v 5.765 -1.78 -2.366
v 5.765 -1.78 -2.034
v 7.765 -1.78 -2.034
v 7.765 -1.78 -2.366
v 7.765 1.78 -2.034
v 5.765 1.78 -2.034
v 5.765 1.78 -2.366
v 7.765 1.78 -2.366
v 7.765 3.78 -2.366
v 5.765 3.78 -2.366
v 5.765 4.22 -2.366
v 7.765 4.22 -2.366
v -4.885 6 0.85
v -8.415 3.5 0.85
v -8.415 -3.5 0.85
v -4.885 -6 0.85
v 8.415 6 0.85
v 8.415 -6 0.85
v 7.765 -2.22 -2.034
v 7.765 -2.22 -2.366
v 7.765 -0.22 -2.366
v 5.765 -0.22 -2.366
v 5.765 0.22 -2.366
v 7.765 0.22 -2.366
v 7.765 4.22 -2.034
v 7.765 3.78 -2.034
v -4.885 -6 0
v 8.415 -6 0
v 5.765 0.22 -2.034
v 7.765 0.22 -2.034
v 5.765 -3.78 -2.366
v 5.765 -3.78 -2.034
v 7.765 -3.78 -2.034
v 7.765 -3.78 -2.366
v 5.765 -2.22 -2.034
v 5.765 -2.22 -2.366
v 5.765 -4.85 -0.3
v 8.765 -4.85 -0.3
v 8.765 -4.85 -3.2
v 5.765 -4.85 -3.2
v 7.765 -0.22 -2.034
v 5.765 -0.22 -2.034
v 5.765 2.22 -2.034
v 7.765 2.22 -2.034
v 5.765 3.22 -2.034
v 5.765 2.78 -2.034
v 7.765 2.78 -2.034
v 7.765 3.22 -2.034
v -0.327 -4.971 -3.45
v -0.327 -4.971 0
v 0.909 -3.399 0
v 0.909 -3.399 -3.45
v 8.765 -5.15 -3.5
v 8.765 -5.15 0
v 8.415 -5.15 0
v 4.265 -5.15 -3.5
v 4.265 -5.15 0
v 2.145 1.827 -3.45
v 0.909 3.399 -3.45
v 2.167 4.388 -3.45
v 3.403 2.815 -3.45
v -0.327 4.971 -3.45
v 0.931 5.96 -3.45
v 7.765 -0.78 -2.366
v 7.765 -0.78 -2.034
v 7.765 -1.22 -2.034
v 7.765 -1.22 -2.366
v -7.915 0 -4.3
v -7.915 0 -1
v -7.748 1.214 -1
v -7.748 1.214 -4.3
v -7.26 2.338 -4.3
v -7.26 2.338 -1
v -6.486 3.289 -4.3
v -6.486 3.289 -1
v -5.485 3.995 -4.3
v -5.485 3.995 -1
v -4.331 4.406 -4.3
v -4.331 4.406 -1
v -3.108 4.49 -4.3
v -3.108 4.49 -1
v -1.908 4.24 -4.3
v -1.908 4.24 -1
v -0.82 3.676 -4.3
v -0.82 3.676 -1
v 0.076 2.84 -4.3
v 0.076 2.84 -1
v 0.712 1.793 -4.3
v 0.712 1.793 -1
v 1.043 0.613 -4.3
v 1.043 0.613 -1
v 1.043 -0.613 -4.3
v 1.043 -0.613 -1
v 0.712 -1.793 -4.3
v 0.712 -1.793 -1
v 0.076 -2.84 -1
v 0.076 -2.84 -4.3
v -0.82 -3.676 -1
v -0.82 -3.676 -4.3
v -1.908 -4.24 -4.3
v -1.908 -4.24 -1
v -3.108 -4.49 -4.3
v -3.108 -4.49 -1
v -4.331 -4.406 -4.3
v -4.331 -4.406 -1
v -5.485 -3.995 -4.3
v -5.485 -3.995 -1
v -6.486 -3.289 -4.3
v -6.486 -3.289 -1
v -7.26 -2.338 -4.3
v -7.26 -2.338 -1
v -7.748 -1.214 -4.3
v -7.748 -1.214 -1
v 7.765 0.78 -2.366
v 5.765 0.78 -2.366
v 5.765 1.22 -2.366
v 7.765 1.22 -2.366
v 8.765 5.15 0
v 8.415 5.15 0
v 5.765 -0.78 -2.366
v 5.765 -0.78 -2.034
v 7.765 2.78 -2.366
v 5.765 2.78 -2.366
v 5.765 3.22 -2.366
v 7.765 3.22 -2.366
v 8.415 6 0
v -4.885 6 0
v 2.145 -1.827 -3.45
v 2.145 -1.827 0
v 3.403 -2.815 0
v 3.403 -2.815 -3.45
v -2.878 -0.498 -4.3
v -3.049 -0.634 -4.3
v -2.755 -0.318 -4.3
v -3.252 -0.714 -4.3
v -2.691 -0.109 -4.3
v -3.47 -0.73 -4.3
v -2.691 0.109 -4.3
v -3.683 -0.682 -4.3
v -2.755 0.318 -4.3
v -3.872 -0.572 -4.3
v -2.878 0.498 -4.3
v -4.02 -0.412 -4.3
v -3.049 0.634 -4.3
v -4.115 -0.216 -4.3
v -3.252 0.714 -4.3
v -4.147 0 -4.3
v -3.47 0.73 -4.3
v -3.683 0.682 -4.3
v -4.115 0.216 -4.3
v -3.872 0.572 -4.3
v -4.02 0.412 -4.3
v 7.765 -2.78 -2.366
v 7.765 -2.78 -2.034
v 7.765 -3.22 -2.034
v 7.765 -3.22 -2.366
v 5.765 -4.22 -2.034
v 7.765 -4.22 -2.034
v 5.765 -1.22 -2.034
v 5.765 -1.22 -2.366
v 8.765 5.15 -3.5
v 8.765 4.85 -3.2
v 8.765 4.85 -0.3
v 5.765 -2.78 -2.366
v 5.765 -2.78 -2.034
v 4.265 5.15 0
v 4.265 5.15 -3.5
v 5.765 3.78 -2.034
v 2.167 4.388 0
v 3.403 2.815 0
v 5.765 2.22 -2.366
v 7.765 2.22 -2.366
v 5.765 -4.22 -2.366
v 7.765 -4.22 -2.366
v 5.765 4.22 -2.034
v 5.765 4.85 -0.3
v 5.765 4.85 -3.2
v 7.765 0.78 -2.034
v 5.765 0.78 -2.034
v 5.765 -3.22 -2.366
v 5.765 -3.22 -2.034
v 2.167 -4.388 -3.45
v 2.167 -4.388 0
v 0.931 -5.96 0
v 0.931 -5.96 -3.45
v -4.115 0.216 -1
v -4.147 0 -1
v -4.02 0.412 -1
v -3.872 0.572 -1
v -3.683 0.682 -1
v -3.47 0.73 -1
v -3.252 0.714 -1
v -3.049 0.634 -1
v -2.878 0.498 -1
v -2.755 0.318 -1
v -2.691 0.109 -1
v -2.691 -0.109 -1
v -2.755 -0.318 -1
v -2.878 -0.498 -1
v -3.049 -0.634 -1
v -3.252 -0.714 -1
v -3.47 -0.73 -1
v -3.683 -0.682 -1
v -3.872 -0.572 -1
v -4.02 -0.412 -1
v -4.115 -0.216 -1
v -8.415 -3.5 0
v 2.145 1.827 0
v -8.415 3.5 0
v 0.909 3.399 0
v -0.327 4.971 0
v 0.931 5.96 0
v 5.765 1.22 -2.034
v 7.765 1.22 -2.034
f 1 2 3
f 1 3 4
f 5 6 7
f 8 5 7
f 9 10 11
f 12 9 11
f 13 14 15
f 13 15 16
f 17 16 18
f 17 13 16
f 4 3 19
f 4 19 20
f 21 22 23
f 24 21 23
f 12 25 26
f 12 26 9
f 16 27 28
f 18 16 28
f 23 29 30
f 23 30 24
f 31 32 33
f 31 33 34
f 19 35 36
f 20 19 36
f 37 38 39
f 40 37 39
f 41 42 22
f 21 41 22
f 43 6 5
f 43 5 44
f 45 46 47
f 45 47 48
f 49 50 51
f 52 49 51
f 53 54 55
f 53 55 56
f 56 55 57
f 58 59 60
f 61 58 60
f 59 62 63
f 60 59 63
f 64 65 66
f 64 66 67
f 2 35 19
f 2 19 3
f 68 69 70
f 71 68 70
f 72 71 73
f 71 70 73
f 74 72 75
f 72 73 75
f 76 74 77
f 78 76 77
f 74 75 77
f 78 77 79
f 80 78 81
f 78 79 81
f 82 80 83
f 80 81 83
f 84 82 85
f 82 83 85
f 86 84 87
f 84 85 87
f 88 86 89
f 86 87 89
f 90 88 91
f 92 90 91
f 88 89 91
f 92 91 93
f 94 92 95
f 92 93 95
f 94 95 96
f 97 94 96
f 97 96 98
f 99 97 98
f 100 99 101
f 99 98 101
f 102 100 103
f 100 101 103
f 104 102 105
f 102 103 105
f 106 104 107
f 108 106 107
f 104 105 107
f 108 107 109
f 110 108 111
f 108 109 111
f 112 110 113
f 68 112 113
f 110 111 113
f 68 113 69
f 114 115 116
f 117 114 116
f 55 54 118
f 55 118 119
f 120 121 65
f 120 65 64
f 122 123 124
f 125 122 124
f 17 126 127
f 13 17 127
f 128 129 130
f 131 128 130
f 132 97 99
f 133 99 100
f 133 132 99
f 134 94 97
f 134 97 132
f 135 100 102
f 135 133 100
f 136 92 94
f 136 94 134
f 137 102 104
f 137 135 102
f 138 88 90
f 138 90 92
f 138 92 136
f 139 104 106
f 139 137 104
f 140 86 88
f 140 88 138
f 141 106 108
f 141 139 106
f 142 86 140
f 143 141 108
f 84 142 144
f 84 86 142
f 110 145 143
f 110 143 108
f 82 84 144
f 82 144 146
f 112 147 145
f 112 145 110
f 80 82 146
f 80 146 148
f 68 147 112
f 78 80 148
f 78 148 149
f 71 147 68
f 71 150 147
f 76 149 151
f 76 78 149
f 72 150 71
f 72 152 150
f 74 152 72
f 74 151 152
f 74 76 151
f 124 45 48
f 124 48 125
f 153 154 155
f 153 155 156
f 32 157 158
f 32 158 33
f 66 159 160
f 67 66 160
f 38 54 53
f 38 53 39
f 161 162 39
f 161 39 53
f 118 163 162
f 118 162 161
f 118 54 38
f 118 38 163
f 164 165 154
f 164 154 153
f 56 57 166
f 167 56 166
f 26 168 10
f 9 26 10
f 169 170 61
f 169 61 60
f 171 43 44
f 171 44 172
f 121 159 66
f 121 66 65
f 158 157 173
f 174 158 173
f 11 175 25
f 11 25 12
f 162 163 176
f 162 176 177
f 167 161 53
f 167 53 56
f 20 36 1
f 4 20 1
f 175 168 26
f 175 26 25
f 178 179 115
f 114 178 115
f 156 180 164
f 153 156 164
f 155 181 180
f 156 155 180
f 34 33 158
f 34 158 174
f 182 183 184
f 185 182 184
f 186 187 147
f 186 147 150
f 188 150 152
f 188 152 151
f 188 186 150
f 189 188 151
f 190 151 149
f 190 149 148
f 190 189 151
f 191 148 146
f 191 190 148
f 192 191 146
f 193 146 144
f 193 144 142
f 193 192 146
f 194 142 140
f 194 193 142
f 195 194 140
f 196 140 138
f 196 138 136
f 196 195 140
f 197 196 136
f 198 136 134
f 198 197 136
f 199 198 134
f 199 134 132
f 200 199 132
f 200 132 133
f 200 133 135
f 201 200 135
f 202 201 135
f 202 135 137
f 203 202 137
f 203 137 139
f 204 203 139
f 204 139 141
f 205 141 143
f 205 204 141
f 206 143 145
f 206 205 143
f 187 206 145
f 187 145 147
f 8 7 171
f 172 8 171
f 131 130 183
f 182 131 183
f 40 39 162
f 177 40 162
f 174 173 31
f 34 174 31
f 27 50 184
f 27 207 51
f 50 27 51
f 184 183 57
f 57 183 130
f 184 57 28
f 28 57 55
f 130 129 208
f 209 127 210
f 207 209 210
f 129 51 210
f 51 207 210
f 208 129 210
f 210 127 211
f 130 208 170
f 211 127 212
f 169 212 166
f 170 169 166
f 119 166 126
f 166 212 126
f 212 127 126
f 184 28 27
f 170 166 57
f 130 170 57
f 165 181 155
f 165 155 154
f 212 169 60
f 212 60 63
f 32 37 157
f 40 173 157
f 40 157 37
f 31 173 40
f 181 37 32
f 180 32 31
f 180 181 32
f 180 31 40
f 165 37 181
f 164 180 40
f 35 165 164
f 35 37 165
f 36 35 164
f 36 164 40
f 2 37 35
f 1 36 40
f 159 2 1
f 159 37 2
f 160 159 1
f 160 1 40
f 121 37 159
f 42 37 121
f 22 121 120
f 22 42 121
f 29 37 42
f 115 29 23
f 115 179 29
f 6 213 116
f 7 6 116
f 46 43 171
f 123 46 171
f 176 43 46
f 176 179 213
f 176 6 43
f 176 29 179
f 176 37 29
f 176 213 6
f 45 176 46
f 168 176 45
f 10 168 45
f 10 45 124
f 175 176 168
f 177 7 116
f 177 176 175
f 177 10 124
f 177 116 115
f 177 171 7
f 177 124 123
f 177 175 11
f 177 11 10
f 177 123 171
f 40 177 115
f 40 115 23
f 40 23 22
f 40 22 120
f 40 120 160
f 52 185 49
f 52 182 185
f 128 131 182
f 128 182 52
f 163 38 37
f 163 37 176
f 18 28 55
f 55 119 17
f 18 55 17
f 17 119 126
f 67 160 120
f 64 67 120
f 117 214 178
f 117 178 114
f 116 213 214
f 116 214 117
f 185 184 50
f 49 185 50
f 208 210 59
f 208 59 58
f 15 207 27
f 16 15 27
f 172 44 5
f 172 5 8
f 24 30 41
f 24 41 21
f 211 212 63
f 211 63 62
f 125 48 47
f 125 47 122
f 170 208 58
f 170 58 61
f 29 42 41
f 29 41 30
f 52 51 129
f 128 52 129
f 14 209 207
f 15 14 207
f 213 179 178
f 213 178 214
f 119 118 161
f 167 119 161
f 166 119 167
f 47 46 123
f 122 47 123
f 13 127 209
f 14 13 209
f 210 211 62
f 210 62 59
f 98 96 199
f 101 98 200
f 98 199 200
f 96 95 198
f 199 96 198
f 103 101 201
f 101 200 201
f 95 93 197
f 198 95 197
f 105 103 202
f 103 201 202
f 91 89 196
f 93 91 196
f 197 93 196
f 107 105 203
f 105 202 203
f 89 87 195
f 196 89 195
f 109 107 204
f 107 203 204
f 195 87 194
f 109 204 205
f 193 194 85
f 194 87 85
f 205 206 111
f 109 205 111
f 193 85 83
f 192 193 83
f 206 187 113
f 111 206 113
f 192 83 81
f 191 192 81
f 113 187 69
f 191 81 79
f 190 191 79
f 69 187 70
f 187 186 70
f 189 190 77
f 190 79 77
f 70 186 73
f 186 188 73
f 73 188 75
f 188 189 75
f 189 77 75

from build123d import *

# Parameters (mm, degrees)
SALIENTE_EXTRUIR1_DEPTH = 0.85
CROQUIS2_R              = 4.5
CROQUIS2_R_2            = 0.732216716
SALIENTE_EXTRUIR2_DEPTH = 3.3
SALIENTE_EXTRUIR3_DEPTH = 3.45
CROQUIS4_W              = 4.5
CROQUIS4_H              = 10.3
SALIENTE_EXTRUIR4_DEPTH = 3.5
CROQUIS5_W              = 2.9
CROQUIS5_H              = 9.7
CORTAR_EXTRUIR1_DEPTH   = 3
CROQUIS6_W              = 0.331262854
CROQUIS6_H              = 0.44
SALIENTE_EXTRUIR6_DEPTH = 2


with BuildPart() as part:
    # Croquis1 → Saliente-Extruir1 (new body)
    with BuildSketch(Plane.XY):
        Polygon((8.415, 6), (-4.885, 6), (-8.415, 3.5), (-8.415, -3.5), (-4.885, -6), (8.415, -6), align=None)
    extrude(amount=SALIENTE_EXTRUIR1_DEPTH)

    # Croquis3 → Saliente-Extruir3 (add)
    with BuildSketch(Plane(origin=(0, 0, 0), x_dir=(-1, 0, 0), z_dir=(0, 0, -1))):
        Polygon((-2.166835619, 4.387836725), (-0.930825273, 5.960184787), (0.327053176, 4.971376511), (-0.908957169, 3.399028449), (-2.144967514, 1.826680388), (-3.402845964, 2.815488664), align=None)
        Polygon((-0.930825273, -5.960184787), (0.327053176, -4.971376511), (-0.908957169, -3.399028449), (-2.144967514, -1.826680388), (-3.402845964, -2.815488664), (-2.166835619, -4.387836725), align=None)
    extrude(amount=SALIENTE_EXTRUIR3_DEPTH)

    # Croquis4 → Saliente-Extruir4 (add)
    with BuildSketch(Plane(origin=(0, 0, 0), x_dir=(-1, 0, 0), z_dir=(0, 0, -1))):
        with Locations((-6.515, 0)):
            Rectangle(CROQUIS4_W, CROQUIS4_H)
    extrude(amount=SALIENTE_EXTRUIR4_DEPTH)

    # Croquis5 → Cortar-Extruir1 (cut)
    with BuildSketch(Plane(origin=(8.765, 0, 0), x_dir=(0, 0, -1), z_dir=(1, 0, 0))):
        with Locations((1.75, 0)):
            Rectangle(CROQUIS5_W, CROQUIS5_H)
    extrude(amount=-CORTAR_EXTRUIR1_DEPTH, mode=Mode.SUBTRACT)

    # Croquis6 → Saliente-Extruir6 (add)
    with BuildSketch(Plane(origin=(5.765, 0, 0), x_dir=(0, 0, -1), z_dir=(1, 0, 0))):
        with Locations((2.2, 0)):
            Rectangle(CROQUIS6_W, CROQUIS6_H)
        with Locations((2.2, 1)):
            Rectangle(CROQUIS6_W, CROQUIS6_H)
        with Locations((2.2, 2)):
            Rectangle(CROQUIS6_W, CROQUIS6_H)
        with Locations((2.2, 3)):
            Rectangle(CROQUIS6_W, CROQUIS6_H)
        with Locations((2.2, 4)):
            Rectangle(CROQUIS6_W, CROQUIS6_H)
        with Locations((2.2, -1)):
            Rectangle(CROQUIS6_W, CROQUIS6_H)
        with Locations((2.2, -2)):
            Rectangle(CROQUIS6_W, CROQUIS6_H)
        with Locations((2.2, -3)):
            Rectangle(CROQUIS6_W, CROQUIS6_H)
        with Locations((2.2, -4)):
            Rectangle(CROQUIS6_W, CROQUIS6_H)
    extrude(amount=SALIENTE_EXTRUIR6_DEPTH)


with BuildPart() as body_2:
    # Croquis2 → Saliente-Extruir2 (new body)
    with BuildSketch(Plane(origin=(0, 0, -1), x_dir=(-1, 0, 0), z_dir=(0, 0, -1))):
        with Locations((3.415, 0)):
            Circle(CROQUIS2_R)
        with Locations((3.415, 0)):
            Circle(CROQUIS2_R_2, mode=Mode.SUBTRACT)
    extrude(amount=SALIENTE_EXTRUIR2_DEPTH)


solid = Compound([part.part, body_2.part])
